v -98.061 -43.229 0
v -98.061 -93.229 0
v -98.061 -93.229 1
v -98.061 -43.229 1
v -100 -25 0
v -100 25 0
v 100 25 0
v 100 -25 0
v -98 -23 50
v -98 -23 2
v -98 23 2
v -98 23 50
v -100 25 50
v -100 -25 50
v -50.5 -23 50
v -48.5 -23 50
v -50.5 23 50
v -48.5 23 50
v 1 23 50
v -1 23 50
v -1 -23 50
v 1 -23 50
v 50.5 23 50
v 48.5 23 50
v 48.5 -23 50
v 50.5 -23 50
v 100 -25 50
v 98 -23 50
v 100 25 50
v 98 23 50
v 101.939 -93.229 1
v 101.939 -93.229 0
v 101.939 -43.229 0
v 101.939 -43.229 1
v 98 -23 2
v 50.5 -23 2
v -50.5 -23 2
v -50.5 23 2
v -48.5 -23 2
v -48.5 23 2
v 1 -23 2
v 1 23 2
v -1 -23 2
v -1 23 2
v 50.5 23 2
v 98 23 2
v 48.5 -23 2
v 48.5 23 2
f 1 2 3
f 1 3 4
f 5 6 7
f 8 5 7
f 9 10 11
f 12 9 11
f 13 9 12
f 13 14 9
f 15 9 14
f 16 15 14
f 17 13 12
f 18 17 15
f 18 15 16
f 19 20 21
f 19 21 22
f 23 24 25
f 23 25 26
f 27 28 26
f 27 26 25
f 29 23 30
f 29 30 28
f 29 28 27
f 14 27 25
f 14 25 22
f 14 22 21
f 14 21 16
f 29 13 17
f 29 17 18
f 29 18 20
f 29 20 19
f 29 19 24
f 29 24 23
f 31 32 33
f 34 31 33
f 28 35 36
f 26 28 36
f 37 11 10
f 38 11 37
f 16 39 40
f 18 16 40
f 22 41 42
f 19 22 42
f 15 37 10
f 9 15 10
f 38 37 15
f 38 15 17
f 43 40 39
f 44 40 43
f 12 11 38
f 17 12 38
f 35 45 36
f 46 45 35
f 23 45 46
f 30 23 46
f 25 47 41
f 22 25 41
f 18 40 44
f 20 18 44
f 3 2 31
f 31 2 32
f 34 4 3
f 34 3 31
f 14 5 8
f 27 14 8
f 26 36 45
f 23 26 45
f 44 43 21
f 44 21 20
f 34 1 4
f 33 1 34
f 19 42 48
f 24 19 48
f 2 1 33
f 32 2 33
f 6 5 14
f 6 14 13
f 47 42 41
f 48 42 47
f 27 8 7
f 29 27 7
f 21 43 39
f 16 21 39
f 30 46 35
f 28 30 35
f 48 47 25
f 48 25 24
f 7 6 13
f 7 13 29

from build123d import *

# Parameters (mm, degrees)
F0_W     = 200
F0_H     = 50
F0_W_2   = 2
F0_H_2   = 46
F1_DEPTH = 50
F0_W_3   = 47.5
F2_DEPTH = 2
F3_W     = 200
F3_H     = 50
F4_DEPTH = 1


with BuildPart() as f1:
    # F0 (on Top) → F1 (new body)
    with BuildSketch(Plane.XY):
        Rectangle(F0_W, F0_H)
        Polygon((-98, -23), (-98, 23), (-50.5, 23), (-48.5, 23), (-1, 23), (1, 23), (48.5, 23), (50.5, 23), (98, 23), (98, -23), (50.5, -23), (48.5, -23), (1, -23), (-1, -23), (-48.5, -23), (-50.5, -23), align=None, mode=Mode.SUBTRACT)
        with Locations((-49.5, 0)):
            Rectangle(F0_W_2, F0_H_2)
        Rectangle(F0_W_2, F0_H_2)
        with Locations((49.5, 0)):
            Rectangle(F0_W_2, F0_H_2)
    extrude(amount=F1_DEPTH)

    # F0 (on Top) → F2 (join)
    with BuildSketch(Plane.XY):
        with Locations((-74.25, 0)):
            Rectangle(F0_W_3, F0_H_2)
        with Locations((-24.75, 0)):
            Rectangle(F0_W_3, F0_H_2)
        with Locations((24.75, 0)):
            Rectangle(F0_W_3, F0_H_2)
        with Locations((74.25, 0)):
            Rectangle(F0_W_3, F0_H_2)
    extrude(amount=F2_DEPTH)


with BuildPart() as f4:
    # F3 (on Top) → F4 (new body)
    with BuildSketch(Plane.XY):
        with Locations((1.938558, -68.229217)):
            Rectangle(F3_W, F3_H)
    extrude(amount=F4_DEPTH)


solid = Compound([f1.part, f4.part])
